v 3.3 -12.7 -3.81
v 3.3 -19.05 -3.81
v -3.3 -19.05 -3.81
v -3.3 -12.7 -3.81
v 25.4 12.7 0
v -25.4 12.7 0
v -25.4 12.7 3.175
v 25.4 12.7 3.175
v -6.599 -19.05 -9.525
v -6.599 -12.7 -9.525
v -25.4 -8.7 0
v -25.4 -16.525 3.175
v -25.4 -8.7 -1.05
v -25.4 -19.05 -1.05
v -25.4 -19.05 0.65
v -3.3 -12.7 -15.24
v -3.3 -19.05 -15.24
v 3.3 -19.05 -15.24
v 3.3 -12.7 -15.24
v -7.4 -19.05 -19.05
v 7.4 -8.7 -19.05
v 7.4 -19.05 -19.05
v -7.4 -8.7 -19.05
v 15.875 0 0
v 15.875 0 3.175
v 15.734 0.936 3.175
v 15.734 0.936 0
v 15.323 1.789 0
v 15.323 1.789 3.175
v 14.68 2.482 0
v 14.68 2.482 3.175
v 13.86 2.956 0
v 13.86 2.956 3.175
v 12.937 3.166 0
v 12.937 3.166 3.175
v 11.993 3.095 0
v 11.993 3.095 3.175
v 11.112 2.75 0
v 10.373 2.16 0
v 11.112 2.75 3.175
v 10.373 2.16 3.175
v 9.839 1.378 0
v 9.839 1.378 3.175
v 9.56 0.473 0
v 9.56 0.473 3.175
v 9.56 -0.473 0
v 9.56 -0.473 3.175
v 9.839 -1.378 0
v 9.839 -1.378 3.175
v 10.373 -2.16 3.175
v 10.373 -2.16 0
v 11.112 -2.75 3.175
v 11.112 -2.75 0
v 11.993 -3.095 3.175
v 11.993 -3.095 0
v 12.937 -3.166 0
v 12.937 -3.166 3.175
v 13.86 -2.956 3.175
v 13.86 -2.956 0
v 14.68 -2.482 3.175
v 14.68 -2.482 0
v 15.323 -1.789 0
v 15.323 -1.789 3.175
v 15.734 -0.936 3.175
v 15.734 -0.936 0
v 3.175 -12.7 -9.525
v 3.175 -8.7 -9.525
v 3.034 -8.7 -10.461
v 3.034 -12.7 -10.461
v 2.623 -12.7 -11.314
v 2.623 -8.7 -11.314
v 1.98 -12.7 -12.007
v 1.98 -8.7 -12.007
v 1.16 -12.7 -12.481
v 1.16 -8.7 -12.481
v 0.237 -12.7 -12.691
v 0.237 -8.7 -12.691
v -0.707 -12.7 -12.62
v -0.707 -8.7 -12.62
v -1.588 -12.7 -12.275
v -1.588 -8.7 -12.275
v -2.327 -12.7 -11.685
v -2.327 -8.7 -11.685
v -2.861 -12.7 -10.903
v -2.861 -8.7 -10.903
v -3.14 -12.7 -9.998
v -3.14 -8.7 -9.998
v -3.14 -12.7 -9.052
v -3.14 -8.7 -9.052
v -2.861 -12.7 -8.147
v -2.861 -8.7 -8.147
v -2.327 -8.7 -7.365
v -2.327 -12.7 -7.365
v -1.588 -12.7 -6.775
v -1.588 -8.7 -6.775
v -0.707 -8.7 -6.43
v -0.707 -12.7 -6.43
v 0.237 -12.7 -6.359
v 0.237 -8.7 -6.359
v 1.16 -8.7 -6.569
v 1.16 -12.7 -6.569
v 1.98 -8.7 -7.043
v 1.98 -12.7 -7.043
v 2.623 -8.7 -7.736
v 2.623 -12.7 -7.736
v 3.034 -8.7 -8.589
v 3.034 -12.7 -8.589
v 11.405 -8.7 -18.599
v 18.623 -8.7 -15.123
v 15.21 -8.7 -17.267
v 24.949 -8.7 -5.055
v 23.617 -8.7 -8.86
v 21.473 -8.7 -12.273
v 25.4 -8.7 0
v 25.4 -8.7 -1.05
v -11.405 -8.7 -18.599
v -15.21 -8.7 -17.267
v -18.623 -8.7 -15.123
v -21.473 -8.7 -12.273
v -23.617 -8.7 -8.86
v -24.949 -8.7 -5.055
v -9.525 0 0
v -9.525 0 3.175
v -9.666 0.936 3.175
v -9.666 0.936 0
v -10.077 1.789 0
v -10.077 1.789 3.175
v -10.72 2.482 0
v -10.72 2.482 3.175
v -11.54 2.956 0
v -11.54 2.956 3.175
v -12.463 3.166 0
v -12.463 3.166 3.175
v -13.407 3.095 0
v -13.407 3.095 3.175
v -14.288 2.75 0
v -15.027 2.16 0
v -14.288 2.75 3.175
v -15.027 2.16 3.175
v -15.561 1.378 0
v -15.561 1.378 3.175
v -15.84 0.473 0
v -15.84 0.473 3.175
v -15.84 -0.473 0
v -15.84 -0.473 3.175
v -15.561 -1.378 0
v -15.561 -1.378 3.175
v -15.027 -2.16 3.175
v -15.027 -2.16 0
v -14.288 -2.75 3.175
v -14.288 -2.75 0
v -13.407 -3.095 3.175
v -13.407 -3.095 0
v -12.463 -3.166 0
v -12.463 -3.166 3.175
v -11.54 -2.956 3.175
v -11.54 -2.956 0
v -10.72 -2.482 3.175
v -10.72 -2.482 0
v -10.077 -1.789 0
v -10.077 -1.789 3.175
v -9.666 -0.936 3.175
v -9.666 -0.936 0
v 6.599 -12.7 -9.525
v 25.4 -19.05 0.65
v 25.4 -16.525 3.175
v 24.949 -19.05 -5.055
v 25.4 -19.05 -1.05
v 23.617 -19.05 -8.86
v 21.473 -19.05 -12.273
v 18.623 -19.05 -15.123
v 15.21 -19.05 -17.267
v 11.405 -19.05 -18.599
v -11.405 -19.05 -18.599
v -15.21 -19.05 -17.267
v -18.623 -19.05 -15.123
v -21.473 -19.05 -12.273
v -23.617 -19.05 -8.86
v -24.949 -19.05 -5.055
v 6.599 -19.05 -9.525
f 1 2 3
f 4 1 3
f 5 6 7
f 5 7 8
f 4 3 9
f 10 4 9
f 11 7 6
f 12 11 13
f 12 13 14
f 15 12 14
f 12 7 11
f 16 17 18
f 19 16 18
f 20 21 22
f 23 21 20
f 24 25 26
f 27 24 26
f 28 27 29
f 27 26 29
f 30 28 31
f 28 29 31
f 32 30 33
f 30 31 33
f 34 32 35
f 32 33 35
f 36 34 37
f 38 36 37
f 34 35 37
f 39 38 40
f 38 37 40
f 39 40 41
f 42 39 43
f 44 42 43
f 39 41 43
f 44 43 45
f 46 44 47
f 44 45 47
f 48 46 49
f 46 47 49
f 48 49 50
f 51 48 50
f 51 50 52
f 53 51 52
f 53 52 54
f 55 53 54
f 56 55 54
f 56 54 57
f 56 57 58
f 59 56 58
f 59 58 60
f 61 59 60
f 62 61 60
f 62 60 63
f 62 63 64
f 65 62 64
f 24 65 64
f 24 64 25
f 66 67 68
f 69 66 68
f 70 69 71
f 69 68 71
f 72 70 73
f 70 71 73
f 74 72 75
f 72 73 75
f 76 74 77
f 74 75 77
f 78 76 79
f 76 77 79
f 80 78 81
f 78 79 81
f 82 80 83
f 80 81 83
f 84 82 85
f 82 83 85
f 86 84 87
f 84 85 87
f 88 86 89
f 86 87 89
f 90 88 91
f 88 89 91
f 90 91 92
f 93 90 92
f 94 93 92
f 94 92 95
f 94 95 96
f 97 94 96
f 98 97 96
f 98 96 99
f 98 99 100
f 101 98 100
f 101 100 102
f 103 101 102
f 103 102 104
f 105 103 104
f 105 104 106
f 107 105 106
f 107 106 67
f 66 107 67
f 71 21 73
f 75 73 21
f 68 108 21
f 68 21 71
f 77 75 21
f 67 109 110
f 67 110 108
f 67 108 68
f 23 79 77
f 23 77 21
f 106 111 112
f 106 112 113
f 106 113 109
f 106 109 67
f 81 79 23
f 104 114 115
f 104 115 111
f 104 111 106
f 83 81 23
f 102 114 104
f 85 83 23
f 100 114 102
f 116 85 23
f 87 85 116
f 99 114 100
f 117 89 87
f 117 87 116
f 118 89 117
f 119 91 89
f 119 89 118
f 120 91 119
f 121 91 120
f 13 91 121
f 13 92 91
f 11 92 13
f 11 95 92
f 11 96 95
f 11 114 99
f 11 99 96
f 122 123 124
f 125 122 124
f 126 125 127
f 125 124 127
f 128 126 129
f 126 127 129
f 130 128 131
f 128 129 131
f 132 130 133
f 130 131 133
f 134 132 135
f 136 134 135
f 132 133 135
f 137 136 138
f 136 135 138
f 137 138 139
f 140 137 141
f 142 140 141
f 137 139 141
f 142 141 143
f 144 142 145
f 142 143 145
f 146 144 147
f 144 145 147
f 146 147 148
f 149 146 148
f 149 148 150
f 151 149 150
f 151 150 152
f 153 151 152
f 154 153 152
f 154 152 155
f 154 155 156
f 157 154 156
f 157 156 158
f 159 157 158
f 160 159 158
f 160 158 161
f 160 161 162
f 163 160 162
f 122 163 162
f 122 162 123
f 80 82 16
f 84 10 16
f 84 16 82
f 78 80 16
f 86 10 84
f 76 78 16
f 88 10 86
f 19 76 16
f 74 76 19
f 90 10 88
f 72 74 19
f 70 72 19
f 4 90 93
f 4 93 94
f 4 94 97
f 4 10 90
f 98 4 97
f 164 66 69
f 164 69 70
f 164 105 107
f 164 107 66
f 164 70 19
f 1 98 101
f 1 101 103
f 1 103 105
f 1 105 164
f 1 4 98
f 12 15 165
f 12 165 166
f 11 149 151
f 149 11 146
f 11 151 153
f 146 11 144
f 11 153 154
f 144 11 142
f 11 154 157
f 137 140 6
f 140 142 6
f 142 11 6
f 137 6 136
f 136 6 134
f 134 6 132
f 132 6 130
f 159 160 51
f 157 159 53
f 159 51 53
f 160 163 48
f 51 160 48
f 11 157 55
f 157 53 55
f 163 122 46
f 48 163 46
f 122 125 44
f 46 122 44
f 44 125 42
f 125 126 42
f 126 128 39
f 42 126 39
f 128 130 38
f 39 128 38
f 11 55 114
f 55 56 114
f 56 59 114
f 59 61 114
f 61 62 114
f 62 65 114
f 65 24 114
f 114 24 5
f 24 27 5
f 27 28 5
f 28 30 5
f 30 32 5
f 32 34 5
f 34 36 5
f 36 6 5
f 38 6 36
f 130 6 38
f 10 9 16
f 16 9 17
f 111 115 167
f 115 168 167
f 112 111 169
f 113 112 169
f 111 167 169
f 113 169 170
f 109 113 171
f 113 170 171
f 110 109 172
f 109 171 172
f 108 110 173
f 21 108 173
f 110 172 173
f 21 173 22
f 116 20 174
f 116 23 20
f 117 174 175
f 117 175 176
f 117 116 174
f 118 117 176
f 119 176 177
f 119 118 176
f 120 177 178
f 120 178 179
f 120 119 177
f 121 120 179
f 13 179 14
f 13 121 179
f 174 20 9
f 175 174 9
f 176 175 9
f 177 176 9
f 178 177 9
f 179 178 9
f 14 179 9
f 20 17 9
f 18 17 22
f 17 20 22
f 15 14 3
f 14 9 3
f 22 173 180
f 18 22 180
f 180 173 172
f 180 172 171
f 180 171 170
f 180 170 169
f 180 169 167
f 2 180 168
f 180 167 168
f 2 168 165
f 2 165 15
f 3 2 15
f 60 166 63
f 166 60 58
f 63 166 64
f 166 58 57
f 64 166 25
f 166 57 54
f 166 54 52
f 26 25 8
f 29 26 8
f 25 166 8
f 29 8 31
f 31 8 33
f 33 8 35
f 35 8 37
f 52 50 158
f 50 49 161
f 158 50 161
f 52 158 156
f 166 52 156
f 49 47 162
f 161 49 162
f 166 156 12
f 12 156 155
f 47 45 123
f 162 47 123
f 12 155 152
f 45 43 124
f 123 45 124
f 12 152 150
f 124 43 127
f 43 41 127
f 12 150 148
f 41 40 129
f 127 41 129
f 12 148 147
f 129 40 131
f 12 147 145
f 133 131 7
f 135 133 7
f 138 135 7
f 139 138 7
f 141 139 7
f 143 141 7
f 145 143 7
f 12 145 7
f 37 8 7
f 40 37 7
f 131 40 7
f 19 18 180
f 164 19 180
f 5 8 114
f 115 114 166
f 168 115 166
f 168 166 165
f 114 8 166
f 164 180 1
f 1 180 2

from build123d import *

# Parameters (mm, degrees)
SKETCH1_W                   = 50.8
SKETCH1_H                   = 25.4
BOSS_EXTRUDE1_DEPTH         = 3.175
F_1_4_0_25_DIAMETER_HOLE1_D = 6.35
SKETCH4_W                   = 50.8
SKETCH4_H                   = 6.35
SKETCH4_H_2                 = 4
BOSS_EXTRUDE2_DEPTH         = 19.05
CUT_EXTRUDE1_DEPTH          = 6.35
F_1_4_0_25_DIAMETER_HOLE2_D = 6.35
FILLET1_R                   = 18
CHAMFER1_SIZE               = 7


with BuildPart() as part:
    # Sketch1 → Boss-Extrude1 (new body)
    with BuildSketch(Plane.XY):
        Rectangle(SKETCH1_W, SKETCH1_H)
    extrude(amount=BOSS_EXTRUDE1_DEPTH)

    # 1/4 (0.25) Diameter Hole1 (through all)
    with Locations(Plane(origin=(0, 0, 0), x_dir=(-1, 0, 0), z_dir=(0, 0, -1))):
        with Locations((-12.7, 0), (12.7, 0)):
            Hole(F_1_4_0_25_DIAMETER_HOLE1_D / 2)

    # Sketch4 → Boss-Extrude2 (add)
    with BuildSketch(Plane(origin=(0, 0, 0), x_dir=(-1, 0, 0), z_dir=(0, 0, -1))):
        with Locations((0, -15.875)):
            Rectangle(SKETCH4_W, SKETCH4_H)
        with Locations((0, -10.7)):
            Rectangle(SKETCH4_W, SKETCH4_H_2)
    extrude(amount=BOSS_EXTRUDE2_DEPTH)

    # Sketch5 → Cut-Extrude1 (cut)
    with BuildSketch(Plane.XZ.offset(19.05)):
        Polygon((-3.299556788, -15.24), (3.299556788, -15.24), (6.599113577, -9.525), (3.299556788, -3.81), (-3.299556788, -3.81), (-6.599113577, -9.525), align=None)
    extrude(amount=-CUT_EXTRUDE1_DEPTH, mode=Mode.SUBTRACT)

    # 1/4 (0.25) Diameter Hole2 (through all)
    with Locations(Plane(origin=(0, -19.05, 0), x_dir=(-1, 0, 0), z_dir=(0, -1, 0))):
        with Locations((0, 9.525)):
            Hole(F_1_4_0_25_DIAMETER_HOLE2_D / 2)

    # Fillet1
    fillet1_edges = [part.edges().sort_by_distance(p)[0] for p in [
        (-25.4, -13.875, -19.05),
        (25.4, -13.875, -19.05),
    ]]
    fillet(fillet1_edges, radius=FILLET1_R)

    # Chamfer1
    # the kernel refuses this chamfer: 7 mm, written as the material it adds along each edge
    with BuildSketch(Plane(origin=(25.4, -12.7, 0), x_dir=(0, -0.9996219169112968, -0.02749587661058637), z_dir=(-1, 0, 0))) as chamfer1_piece_1_section:
        Polygon((CHAMFER1_SIZE * 0.999621916911, CHAMFER1_SIZE * 0.0274958766106), (-CHAMFER1_SIZE * 0.0274958766106, CHAMFER1_SIZE * 0.999621916911), (0, 0), align=None)
    chamfer1_piece_1 = extrude(amount=50.8, mode=Mode.PRIVATE)
    chamfer1_piece_1 = split(chamfer1_piece_1, bisect_by=Plane(origin=(0, -19.05, 1.366790838), z_dir=(0, 1, 0)), keep=Keep.TOP, mode=Mode.PRIVATE)
    chamfer1_piece_1 = split(chamfer1_piece_1, bisect_by=Plane(origin=(0, -15.42419562, 3.175), z_dir=(0, 0, -1)), keep=Keep.TOP, mode=Mode.PRIVATE)
    add(chamfer1_piece_1)


solid = part.part
